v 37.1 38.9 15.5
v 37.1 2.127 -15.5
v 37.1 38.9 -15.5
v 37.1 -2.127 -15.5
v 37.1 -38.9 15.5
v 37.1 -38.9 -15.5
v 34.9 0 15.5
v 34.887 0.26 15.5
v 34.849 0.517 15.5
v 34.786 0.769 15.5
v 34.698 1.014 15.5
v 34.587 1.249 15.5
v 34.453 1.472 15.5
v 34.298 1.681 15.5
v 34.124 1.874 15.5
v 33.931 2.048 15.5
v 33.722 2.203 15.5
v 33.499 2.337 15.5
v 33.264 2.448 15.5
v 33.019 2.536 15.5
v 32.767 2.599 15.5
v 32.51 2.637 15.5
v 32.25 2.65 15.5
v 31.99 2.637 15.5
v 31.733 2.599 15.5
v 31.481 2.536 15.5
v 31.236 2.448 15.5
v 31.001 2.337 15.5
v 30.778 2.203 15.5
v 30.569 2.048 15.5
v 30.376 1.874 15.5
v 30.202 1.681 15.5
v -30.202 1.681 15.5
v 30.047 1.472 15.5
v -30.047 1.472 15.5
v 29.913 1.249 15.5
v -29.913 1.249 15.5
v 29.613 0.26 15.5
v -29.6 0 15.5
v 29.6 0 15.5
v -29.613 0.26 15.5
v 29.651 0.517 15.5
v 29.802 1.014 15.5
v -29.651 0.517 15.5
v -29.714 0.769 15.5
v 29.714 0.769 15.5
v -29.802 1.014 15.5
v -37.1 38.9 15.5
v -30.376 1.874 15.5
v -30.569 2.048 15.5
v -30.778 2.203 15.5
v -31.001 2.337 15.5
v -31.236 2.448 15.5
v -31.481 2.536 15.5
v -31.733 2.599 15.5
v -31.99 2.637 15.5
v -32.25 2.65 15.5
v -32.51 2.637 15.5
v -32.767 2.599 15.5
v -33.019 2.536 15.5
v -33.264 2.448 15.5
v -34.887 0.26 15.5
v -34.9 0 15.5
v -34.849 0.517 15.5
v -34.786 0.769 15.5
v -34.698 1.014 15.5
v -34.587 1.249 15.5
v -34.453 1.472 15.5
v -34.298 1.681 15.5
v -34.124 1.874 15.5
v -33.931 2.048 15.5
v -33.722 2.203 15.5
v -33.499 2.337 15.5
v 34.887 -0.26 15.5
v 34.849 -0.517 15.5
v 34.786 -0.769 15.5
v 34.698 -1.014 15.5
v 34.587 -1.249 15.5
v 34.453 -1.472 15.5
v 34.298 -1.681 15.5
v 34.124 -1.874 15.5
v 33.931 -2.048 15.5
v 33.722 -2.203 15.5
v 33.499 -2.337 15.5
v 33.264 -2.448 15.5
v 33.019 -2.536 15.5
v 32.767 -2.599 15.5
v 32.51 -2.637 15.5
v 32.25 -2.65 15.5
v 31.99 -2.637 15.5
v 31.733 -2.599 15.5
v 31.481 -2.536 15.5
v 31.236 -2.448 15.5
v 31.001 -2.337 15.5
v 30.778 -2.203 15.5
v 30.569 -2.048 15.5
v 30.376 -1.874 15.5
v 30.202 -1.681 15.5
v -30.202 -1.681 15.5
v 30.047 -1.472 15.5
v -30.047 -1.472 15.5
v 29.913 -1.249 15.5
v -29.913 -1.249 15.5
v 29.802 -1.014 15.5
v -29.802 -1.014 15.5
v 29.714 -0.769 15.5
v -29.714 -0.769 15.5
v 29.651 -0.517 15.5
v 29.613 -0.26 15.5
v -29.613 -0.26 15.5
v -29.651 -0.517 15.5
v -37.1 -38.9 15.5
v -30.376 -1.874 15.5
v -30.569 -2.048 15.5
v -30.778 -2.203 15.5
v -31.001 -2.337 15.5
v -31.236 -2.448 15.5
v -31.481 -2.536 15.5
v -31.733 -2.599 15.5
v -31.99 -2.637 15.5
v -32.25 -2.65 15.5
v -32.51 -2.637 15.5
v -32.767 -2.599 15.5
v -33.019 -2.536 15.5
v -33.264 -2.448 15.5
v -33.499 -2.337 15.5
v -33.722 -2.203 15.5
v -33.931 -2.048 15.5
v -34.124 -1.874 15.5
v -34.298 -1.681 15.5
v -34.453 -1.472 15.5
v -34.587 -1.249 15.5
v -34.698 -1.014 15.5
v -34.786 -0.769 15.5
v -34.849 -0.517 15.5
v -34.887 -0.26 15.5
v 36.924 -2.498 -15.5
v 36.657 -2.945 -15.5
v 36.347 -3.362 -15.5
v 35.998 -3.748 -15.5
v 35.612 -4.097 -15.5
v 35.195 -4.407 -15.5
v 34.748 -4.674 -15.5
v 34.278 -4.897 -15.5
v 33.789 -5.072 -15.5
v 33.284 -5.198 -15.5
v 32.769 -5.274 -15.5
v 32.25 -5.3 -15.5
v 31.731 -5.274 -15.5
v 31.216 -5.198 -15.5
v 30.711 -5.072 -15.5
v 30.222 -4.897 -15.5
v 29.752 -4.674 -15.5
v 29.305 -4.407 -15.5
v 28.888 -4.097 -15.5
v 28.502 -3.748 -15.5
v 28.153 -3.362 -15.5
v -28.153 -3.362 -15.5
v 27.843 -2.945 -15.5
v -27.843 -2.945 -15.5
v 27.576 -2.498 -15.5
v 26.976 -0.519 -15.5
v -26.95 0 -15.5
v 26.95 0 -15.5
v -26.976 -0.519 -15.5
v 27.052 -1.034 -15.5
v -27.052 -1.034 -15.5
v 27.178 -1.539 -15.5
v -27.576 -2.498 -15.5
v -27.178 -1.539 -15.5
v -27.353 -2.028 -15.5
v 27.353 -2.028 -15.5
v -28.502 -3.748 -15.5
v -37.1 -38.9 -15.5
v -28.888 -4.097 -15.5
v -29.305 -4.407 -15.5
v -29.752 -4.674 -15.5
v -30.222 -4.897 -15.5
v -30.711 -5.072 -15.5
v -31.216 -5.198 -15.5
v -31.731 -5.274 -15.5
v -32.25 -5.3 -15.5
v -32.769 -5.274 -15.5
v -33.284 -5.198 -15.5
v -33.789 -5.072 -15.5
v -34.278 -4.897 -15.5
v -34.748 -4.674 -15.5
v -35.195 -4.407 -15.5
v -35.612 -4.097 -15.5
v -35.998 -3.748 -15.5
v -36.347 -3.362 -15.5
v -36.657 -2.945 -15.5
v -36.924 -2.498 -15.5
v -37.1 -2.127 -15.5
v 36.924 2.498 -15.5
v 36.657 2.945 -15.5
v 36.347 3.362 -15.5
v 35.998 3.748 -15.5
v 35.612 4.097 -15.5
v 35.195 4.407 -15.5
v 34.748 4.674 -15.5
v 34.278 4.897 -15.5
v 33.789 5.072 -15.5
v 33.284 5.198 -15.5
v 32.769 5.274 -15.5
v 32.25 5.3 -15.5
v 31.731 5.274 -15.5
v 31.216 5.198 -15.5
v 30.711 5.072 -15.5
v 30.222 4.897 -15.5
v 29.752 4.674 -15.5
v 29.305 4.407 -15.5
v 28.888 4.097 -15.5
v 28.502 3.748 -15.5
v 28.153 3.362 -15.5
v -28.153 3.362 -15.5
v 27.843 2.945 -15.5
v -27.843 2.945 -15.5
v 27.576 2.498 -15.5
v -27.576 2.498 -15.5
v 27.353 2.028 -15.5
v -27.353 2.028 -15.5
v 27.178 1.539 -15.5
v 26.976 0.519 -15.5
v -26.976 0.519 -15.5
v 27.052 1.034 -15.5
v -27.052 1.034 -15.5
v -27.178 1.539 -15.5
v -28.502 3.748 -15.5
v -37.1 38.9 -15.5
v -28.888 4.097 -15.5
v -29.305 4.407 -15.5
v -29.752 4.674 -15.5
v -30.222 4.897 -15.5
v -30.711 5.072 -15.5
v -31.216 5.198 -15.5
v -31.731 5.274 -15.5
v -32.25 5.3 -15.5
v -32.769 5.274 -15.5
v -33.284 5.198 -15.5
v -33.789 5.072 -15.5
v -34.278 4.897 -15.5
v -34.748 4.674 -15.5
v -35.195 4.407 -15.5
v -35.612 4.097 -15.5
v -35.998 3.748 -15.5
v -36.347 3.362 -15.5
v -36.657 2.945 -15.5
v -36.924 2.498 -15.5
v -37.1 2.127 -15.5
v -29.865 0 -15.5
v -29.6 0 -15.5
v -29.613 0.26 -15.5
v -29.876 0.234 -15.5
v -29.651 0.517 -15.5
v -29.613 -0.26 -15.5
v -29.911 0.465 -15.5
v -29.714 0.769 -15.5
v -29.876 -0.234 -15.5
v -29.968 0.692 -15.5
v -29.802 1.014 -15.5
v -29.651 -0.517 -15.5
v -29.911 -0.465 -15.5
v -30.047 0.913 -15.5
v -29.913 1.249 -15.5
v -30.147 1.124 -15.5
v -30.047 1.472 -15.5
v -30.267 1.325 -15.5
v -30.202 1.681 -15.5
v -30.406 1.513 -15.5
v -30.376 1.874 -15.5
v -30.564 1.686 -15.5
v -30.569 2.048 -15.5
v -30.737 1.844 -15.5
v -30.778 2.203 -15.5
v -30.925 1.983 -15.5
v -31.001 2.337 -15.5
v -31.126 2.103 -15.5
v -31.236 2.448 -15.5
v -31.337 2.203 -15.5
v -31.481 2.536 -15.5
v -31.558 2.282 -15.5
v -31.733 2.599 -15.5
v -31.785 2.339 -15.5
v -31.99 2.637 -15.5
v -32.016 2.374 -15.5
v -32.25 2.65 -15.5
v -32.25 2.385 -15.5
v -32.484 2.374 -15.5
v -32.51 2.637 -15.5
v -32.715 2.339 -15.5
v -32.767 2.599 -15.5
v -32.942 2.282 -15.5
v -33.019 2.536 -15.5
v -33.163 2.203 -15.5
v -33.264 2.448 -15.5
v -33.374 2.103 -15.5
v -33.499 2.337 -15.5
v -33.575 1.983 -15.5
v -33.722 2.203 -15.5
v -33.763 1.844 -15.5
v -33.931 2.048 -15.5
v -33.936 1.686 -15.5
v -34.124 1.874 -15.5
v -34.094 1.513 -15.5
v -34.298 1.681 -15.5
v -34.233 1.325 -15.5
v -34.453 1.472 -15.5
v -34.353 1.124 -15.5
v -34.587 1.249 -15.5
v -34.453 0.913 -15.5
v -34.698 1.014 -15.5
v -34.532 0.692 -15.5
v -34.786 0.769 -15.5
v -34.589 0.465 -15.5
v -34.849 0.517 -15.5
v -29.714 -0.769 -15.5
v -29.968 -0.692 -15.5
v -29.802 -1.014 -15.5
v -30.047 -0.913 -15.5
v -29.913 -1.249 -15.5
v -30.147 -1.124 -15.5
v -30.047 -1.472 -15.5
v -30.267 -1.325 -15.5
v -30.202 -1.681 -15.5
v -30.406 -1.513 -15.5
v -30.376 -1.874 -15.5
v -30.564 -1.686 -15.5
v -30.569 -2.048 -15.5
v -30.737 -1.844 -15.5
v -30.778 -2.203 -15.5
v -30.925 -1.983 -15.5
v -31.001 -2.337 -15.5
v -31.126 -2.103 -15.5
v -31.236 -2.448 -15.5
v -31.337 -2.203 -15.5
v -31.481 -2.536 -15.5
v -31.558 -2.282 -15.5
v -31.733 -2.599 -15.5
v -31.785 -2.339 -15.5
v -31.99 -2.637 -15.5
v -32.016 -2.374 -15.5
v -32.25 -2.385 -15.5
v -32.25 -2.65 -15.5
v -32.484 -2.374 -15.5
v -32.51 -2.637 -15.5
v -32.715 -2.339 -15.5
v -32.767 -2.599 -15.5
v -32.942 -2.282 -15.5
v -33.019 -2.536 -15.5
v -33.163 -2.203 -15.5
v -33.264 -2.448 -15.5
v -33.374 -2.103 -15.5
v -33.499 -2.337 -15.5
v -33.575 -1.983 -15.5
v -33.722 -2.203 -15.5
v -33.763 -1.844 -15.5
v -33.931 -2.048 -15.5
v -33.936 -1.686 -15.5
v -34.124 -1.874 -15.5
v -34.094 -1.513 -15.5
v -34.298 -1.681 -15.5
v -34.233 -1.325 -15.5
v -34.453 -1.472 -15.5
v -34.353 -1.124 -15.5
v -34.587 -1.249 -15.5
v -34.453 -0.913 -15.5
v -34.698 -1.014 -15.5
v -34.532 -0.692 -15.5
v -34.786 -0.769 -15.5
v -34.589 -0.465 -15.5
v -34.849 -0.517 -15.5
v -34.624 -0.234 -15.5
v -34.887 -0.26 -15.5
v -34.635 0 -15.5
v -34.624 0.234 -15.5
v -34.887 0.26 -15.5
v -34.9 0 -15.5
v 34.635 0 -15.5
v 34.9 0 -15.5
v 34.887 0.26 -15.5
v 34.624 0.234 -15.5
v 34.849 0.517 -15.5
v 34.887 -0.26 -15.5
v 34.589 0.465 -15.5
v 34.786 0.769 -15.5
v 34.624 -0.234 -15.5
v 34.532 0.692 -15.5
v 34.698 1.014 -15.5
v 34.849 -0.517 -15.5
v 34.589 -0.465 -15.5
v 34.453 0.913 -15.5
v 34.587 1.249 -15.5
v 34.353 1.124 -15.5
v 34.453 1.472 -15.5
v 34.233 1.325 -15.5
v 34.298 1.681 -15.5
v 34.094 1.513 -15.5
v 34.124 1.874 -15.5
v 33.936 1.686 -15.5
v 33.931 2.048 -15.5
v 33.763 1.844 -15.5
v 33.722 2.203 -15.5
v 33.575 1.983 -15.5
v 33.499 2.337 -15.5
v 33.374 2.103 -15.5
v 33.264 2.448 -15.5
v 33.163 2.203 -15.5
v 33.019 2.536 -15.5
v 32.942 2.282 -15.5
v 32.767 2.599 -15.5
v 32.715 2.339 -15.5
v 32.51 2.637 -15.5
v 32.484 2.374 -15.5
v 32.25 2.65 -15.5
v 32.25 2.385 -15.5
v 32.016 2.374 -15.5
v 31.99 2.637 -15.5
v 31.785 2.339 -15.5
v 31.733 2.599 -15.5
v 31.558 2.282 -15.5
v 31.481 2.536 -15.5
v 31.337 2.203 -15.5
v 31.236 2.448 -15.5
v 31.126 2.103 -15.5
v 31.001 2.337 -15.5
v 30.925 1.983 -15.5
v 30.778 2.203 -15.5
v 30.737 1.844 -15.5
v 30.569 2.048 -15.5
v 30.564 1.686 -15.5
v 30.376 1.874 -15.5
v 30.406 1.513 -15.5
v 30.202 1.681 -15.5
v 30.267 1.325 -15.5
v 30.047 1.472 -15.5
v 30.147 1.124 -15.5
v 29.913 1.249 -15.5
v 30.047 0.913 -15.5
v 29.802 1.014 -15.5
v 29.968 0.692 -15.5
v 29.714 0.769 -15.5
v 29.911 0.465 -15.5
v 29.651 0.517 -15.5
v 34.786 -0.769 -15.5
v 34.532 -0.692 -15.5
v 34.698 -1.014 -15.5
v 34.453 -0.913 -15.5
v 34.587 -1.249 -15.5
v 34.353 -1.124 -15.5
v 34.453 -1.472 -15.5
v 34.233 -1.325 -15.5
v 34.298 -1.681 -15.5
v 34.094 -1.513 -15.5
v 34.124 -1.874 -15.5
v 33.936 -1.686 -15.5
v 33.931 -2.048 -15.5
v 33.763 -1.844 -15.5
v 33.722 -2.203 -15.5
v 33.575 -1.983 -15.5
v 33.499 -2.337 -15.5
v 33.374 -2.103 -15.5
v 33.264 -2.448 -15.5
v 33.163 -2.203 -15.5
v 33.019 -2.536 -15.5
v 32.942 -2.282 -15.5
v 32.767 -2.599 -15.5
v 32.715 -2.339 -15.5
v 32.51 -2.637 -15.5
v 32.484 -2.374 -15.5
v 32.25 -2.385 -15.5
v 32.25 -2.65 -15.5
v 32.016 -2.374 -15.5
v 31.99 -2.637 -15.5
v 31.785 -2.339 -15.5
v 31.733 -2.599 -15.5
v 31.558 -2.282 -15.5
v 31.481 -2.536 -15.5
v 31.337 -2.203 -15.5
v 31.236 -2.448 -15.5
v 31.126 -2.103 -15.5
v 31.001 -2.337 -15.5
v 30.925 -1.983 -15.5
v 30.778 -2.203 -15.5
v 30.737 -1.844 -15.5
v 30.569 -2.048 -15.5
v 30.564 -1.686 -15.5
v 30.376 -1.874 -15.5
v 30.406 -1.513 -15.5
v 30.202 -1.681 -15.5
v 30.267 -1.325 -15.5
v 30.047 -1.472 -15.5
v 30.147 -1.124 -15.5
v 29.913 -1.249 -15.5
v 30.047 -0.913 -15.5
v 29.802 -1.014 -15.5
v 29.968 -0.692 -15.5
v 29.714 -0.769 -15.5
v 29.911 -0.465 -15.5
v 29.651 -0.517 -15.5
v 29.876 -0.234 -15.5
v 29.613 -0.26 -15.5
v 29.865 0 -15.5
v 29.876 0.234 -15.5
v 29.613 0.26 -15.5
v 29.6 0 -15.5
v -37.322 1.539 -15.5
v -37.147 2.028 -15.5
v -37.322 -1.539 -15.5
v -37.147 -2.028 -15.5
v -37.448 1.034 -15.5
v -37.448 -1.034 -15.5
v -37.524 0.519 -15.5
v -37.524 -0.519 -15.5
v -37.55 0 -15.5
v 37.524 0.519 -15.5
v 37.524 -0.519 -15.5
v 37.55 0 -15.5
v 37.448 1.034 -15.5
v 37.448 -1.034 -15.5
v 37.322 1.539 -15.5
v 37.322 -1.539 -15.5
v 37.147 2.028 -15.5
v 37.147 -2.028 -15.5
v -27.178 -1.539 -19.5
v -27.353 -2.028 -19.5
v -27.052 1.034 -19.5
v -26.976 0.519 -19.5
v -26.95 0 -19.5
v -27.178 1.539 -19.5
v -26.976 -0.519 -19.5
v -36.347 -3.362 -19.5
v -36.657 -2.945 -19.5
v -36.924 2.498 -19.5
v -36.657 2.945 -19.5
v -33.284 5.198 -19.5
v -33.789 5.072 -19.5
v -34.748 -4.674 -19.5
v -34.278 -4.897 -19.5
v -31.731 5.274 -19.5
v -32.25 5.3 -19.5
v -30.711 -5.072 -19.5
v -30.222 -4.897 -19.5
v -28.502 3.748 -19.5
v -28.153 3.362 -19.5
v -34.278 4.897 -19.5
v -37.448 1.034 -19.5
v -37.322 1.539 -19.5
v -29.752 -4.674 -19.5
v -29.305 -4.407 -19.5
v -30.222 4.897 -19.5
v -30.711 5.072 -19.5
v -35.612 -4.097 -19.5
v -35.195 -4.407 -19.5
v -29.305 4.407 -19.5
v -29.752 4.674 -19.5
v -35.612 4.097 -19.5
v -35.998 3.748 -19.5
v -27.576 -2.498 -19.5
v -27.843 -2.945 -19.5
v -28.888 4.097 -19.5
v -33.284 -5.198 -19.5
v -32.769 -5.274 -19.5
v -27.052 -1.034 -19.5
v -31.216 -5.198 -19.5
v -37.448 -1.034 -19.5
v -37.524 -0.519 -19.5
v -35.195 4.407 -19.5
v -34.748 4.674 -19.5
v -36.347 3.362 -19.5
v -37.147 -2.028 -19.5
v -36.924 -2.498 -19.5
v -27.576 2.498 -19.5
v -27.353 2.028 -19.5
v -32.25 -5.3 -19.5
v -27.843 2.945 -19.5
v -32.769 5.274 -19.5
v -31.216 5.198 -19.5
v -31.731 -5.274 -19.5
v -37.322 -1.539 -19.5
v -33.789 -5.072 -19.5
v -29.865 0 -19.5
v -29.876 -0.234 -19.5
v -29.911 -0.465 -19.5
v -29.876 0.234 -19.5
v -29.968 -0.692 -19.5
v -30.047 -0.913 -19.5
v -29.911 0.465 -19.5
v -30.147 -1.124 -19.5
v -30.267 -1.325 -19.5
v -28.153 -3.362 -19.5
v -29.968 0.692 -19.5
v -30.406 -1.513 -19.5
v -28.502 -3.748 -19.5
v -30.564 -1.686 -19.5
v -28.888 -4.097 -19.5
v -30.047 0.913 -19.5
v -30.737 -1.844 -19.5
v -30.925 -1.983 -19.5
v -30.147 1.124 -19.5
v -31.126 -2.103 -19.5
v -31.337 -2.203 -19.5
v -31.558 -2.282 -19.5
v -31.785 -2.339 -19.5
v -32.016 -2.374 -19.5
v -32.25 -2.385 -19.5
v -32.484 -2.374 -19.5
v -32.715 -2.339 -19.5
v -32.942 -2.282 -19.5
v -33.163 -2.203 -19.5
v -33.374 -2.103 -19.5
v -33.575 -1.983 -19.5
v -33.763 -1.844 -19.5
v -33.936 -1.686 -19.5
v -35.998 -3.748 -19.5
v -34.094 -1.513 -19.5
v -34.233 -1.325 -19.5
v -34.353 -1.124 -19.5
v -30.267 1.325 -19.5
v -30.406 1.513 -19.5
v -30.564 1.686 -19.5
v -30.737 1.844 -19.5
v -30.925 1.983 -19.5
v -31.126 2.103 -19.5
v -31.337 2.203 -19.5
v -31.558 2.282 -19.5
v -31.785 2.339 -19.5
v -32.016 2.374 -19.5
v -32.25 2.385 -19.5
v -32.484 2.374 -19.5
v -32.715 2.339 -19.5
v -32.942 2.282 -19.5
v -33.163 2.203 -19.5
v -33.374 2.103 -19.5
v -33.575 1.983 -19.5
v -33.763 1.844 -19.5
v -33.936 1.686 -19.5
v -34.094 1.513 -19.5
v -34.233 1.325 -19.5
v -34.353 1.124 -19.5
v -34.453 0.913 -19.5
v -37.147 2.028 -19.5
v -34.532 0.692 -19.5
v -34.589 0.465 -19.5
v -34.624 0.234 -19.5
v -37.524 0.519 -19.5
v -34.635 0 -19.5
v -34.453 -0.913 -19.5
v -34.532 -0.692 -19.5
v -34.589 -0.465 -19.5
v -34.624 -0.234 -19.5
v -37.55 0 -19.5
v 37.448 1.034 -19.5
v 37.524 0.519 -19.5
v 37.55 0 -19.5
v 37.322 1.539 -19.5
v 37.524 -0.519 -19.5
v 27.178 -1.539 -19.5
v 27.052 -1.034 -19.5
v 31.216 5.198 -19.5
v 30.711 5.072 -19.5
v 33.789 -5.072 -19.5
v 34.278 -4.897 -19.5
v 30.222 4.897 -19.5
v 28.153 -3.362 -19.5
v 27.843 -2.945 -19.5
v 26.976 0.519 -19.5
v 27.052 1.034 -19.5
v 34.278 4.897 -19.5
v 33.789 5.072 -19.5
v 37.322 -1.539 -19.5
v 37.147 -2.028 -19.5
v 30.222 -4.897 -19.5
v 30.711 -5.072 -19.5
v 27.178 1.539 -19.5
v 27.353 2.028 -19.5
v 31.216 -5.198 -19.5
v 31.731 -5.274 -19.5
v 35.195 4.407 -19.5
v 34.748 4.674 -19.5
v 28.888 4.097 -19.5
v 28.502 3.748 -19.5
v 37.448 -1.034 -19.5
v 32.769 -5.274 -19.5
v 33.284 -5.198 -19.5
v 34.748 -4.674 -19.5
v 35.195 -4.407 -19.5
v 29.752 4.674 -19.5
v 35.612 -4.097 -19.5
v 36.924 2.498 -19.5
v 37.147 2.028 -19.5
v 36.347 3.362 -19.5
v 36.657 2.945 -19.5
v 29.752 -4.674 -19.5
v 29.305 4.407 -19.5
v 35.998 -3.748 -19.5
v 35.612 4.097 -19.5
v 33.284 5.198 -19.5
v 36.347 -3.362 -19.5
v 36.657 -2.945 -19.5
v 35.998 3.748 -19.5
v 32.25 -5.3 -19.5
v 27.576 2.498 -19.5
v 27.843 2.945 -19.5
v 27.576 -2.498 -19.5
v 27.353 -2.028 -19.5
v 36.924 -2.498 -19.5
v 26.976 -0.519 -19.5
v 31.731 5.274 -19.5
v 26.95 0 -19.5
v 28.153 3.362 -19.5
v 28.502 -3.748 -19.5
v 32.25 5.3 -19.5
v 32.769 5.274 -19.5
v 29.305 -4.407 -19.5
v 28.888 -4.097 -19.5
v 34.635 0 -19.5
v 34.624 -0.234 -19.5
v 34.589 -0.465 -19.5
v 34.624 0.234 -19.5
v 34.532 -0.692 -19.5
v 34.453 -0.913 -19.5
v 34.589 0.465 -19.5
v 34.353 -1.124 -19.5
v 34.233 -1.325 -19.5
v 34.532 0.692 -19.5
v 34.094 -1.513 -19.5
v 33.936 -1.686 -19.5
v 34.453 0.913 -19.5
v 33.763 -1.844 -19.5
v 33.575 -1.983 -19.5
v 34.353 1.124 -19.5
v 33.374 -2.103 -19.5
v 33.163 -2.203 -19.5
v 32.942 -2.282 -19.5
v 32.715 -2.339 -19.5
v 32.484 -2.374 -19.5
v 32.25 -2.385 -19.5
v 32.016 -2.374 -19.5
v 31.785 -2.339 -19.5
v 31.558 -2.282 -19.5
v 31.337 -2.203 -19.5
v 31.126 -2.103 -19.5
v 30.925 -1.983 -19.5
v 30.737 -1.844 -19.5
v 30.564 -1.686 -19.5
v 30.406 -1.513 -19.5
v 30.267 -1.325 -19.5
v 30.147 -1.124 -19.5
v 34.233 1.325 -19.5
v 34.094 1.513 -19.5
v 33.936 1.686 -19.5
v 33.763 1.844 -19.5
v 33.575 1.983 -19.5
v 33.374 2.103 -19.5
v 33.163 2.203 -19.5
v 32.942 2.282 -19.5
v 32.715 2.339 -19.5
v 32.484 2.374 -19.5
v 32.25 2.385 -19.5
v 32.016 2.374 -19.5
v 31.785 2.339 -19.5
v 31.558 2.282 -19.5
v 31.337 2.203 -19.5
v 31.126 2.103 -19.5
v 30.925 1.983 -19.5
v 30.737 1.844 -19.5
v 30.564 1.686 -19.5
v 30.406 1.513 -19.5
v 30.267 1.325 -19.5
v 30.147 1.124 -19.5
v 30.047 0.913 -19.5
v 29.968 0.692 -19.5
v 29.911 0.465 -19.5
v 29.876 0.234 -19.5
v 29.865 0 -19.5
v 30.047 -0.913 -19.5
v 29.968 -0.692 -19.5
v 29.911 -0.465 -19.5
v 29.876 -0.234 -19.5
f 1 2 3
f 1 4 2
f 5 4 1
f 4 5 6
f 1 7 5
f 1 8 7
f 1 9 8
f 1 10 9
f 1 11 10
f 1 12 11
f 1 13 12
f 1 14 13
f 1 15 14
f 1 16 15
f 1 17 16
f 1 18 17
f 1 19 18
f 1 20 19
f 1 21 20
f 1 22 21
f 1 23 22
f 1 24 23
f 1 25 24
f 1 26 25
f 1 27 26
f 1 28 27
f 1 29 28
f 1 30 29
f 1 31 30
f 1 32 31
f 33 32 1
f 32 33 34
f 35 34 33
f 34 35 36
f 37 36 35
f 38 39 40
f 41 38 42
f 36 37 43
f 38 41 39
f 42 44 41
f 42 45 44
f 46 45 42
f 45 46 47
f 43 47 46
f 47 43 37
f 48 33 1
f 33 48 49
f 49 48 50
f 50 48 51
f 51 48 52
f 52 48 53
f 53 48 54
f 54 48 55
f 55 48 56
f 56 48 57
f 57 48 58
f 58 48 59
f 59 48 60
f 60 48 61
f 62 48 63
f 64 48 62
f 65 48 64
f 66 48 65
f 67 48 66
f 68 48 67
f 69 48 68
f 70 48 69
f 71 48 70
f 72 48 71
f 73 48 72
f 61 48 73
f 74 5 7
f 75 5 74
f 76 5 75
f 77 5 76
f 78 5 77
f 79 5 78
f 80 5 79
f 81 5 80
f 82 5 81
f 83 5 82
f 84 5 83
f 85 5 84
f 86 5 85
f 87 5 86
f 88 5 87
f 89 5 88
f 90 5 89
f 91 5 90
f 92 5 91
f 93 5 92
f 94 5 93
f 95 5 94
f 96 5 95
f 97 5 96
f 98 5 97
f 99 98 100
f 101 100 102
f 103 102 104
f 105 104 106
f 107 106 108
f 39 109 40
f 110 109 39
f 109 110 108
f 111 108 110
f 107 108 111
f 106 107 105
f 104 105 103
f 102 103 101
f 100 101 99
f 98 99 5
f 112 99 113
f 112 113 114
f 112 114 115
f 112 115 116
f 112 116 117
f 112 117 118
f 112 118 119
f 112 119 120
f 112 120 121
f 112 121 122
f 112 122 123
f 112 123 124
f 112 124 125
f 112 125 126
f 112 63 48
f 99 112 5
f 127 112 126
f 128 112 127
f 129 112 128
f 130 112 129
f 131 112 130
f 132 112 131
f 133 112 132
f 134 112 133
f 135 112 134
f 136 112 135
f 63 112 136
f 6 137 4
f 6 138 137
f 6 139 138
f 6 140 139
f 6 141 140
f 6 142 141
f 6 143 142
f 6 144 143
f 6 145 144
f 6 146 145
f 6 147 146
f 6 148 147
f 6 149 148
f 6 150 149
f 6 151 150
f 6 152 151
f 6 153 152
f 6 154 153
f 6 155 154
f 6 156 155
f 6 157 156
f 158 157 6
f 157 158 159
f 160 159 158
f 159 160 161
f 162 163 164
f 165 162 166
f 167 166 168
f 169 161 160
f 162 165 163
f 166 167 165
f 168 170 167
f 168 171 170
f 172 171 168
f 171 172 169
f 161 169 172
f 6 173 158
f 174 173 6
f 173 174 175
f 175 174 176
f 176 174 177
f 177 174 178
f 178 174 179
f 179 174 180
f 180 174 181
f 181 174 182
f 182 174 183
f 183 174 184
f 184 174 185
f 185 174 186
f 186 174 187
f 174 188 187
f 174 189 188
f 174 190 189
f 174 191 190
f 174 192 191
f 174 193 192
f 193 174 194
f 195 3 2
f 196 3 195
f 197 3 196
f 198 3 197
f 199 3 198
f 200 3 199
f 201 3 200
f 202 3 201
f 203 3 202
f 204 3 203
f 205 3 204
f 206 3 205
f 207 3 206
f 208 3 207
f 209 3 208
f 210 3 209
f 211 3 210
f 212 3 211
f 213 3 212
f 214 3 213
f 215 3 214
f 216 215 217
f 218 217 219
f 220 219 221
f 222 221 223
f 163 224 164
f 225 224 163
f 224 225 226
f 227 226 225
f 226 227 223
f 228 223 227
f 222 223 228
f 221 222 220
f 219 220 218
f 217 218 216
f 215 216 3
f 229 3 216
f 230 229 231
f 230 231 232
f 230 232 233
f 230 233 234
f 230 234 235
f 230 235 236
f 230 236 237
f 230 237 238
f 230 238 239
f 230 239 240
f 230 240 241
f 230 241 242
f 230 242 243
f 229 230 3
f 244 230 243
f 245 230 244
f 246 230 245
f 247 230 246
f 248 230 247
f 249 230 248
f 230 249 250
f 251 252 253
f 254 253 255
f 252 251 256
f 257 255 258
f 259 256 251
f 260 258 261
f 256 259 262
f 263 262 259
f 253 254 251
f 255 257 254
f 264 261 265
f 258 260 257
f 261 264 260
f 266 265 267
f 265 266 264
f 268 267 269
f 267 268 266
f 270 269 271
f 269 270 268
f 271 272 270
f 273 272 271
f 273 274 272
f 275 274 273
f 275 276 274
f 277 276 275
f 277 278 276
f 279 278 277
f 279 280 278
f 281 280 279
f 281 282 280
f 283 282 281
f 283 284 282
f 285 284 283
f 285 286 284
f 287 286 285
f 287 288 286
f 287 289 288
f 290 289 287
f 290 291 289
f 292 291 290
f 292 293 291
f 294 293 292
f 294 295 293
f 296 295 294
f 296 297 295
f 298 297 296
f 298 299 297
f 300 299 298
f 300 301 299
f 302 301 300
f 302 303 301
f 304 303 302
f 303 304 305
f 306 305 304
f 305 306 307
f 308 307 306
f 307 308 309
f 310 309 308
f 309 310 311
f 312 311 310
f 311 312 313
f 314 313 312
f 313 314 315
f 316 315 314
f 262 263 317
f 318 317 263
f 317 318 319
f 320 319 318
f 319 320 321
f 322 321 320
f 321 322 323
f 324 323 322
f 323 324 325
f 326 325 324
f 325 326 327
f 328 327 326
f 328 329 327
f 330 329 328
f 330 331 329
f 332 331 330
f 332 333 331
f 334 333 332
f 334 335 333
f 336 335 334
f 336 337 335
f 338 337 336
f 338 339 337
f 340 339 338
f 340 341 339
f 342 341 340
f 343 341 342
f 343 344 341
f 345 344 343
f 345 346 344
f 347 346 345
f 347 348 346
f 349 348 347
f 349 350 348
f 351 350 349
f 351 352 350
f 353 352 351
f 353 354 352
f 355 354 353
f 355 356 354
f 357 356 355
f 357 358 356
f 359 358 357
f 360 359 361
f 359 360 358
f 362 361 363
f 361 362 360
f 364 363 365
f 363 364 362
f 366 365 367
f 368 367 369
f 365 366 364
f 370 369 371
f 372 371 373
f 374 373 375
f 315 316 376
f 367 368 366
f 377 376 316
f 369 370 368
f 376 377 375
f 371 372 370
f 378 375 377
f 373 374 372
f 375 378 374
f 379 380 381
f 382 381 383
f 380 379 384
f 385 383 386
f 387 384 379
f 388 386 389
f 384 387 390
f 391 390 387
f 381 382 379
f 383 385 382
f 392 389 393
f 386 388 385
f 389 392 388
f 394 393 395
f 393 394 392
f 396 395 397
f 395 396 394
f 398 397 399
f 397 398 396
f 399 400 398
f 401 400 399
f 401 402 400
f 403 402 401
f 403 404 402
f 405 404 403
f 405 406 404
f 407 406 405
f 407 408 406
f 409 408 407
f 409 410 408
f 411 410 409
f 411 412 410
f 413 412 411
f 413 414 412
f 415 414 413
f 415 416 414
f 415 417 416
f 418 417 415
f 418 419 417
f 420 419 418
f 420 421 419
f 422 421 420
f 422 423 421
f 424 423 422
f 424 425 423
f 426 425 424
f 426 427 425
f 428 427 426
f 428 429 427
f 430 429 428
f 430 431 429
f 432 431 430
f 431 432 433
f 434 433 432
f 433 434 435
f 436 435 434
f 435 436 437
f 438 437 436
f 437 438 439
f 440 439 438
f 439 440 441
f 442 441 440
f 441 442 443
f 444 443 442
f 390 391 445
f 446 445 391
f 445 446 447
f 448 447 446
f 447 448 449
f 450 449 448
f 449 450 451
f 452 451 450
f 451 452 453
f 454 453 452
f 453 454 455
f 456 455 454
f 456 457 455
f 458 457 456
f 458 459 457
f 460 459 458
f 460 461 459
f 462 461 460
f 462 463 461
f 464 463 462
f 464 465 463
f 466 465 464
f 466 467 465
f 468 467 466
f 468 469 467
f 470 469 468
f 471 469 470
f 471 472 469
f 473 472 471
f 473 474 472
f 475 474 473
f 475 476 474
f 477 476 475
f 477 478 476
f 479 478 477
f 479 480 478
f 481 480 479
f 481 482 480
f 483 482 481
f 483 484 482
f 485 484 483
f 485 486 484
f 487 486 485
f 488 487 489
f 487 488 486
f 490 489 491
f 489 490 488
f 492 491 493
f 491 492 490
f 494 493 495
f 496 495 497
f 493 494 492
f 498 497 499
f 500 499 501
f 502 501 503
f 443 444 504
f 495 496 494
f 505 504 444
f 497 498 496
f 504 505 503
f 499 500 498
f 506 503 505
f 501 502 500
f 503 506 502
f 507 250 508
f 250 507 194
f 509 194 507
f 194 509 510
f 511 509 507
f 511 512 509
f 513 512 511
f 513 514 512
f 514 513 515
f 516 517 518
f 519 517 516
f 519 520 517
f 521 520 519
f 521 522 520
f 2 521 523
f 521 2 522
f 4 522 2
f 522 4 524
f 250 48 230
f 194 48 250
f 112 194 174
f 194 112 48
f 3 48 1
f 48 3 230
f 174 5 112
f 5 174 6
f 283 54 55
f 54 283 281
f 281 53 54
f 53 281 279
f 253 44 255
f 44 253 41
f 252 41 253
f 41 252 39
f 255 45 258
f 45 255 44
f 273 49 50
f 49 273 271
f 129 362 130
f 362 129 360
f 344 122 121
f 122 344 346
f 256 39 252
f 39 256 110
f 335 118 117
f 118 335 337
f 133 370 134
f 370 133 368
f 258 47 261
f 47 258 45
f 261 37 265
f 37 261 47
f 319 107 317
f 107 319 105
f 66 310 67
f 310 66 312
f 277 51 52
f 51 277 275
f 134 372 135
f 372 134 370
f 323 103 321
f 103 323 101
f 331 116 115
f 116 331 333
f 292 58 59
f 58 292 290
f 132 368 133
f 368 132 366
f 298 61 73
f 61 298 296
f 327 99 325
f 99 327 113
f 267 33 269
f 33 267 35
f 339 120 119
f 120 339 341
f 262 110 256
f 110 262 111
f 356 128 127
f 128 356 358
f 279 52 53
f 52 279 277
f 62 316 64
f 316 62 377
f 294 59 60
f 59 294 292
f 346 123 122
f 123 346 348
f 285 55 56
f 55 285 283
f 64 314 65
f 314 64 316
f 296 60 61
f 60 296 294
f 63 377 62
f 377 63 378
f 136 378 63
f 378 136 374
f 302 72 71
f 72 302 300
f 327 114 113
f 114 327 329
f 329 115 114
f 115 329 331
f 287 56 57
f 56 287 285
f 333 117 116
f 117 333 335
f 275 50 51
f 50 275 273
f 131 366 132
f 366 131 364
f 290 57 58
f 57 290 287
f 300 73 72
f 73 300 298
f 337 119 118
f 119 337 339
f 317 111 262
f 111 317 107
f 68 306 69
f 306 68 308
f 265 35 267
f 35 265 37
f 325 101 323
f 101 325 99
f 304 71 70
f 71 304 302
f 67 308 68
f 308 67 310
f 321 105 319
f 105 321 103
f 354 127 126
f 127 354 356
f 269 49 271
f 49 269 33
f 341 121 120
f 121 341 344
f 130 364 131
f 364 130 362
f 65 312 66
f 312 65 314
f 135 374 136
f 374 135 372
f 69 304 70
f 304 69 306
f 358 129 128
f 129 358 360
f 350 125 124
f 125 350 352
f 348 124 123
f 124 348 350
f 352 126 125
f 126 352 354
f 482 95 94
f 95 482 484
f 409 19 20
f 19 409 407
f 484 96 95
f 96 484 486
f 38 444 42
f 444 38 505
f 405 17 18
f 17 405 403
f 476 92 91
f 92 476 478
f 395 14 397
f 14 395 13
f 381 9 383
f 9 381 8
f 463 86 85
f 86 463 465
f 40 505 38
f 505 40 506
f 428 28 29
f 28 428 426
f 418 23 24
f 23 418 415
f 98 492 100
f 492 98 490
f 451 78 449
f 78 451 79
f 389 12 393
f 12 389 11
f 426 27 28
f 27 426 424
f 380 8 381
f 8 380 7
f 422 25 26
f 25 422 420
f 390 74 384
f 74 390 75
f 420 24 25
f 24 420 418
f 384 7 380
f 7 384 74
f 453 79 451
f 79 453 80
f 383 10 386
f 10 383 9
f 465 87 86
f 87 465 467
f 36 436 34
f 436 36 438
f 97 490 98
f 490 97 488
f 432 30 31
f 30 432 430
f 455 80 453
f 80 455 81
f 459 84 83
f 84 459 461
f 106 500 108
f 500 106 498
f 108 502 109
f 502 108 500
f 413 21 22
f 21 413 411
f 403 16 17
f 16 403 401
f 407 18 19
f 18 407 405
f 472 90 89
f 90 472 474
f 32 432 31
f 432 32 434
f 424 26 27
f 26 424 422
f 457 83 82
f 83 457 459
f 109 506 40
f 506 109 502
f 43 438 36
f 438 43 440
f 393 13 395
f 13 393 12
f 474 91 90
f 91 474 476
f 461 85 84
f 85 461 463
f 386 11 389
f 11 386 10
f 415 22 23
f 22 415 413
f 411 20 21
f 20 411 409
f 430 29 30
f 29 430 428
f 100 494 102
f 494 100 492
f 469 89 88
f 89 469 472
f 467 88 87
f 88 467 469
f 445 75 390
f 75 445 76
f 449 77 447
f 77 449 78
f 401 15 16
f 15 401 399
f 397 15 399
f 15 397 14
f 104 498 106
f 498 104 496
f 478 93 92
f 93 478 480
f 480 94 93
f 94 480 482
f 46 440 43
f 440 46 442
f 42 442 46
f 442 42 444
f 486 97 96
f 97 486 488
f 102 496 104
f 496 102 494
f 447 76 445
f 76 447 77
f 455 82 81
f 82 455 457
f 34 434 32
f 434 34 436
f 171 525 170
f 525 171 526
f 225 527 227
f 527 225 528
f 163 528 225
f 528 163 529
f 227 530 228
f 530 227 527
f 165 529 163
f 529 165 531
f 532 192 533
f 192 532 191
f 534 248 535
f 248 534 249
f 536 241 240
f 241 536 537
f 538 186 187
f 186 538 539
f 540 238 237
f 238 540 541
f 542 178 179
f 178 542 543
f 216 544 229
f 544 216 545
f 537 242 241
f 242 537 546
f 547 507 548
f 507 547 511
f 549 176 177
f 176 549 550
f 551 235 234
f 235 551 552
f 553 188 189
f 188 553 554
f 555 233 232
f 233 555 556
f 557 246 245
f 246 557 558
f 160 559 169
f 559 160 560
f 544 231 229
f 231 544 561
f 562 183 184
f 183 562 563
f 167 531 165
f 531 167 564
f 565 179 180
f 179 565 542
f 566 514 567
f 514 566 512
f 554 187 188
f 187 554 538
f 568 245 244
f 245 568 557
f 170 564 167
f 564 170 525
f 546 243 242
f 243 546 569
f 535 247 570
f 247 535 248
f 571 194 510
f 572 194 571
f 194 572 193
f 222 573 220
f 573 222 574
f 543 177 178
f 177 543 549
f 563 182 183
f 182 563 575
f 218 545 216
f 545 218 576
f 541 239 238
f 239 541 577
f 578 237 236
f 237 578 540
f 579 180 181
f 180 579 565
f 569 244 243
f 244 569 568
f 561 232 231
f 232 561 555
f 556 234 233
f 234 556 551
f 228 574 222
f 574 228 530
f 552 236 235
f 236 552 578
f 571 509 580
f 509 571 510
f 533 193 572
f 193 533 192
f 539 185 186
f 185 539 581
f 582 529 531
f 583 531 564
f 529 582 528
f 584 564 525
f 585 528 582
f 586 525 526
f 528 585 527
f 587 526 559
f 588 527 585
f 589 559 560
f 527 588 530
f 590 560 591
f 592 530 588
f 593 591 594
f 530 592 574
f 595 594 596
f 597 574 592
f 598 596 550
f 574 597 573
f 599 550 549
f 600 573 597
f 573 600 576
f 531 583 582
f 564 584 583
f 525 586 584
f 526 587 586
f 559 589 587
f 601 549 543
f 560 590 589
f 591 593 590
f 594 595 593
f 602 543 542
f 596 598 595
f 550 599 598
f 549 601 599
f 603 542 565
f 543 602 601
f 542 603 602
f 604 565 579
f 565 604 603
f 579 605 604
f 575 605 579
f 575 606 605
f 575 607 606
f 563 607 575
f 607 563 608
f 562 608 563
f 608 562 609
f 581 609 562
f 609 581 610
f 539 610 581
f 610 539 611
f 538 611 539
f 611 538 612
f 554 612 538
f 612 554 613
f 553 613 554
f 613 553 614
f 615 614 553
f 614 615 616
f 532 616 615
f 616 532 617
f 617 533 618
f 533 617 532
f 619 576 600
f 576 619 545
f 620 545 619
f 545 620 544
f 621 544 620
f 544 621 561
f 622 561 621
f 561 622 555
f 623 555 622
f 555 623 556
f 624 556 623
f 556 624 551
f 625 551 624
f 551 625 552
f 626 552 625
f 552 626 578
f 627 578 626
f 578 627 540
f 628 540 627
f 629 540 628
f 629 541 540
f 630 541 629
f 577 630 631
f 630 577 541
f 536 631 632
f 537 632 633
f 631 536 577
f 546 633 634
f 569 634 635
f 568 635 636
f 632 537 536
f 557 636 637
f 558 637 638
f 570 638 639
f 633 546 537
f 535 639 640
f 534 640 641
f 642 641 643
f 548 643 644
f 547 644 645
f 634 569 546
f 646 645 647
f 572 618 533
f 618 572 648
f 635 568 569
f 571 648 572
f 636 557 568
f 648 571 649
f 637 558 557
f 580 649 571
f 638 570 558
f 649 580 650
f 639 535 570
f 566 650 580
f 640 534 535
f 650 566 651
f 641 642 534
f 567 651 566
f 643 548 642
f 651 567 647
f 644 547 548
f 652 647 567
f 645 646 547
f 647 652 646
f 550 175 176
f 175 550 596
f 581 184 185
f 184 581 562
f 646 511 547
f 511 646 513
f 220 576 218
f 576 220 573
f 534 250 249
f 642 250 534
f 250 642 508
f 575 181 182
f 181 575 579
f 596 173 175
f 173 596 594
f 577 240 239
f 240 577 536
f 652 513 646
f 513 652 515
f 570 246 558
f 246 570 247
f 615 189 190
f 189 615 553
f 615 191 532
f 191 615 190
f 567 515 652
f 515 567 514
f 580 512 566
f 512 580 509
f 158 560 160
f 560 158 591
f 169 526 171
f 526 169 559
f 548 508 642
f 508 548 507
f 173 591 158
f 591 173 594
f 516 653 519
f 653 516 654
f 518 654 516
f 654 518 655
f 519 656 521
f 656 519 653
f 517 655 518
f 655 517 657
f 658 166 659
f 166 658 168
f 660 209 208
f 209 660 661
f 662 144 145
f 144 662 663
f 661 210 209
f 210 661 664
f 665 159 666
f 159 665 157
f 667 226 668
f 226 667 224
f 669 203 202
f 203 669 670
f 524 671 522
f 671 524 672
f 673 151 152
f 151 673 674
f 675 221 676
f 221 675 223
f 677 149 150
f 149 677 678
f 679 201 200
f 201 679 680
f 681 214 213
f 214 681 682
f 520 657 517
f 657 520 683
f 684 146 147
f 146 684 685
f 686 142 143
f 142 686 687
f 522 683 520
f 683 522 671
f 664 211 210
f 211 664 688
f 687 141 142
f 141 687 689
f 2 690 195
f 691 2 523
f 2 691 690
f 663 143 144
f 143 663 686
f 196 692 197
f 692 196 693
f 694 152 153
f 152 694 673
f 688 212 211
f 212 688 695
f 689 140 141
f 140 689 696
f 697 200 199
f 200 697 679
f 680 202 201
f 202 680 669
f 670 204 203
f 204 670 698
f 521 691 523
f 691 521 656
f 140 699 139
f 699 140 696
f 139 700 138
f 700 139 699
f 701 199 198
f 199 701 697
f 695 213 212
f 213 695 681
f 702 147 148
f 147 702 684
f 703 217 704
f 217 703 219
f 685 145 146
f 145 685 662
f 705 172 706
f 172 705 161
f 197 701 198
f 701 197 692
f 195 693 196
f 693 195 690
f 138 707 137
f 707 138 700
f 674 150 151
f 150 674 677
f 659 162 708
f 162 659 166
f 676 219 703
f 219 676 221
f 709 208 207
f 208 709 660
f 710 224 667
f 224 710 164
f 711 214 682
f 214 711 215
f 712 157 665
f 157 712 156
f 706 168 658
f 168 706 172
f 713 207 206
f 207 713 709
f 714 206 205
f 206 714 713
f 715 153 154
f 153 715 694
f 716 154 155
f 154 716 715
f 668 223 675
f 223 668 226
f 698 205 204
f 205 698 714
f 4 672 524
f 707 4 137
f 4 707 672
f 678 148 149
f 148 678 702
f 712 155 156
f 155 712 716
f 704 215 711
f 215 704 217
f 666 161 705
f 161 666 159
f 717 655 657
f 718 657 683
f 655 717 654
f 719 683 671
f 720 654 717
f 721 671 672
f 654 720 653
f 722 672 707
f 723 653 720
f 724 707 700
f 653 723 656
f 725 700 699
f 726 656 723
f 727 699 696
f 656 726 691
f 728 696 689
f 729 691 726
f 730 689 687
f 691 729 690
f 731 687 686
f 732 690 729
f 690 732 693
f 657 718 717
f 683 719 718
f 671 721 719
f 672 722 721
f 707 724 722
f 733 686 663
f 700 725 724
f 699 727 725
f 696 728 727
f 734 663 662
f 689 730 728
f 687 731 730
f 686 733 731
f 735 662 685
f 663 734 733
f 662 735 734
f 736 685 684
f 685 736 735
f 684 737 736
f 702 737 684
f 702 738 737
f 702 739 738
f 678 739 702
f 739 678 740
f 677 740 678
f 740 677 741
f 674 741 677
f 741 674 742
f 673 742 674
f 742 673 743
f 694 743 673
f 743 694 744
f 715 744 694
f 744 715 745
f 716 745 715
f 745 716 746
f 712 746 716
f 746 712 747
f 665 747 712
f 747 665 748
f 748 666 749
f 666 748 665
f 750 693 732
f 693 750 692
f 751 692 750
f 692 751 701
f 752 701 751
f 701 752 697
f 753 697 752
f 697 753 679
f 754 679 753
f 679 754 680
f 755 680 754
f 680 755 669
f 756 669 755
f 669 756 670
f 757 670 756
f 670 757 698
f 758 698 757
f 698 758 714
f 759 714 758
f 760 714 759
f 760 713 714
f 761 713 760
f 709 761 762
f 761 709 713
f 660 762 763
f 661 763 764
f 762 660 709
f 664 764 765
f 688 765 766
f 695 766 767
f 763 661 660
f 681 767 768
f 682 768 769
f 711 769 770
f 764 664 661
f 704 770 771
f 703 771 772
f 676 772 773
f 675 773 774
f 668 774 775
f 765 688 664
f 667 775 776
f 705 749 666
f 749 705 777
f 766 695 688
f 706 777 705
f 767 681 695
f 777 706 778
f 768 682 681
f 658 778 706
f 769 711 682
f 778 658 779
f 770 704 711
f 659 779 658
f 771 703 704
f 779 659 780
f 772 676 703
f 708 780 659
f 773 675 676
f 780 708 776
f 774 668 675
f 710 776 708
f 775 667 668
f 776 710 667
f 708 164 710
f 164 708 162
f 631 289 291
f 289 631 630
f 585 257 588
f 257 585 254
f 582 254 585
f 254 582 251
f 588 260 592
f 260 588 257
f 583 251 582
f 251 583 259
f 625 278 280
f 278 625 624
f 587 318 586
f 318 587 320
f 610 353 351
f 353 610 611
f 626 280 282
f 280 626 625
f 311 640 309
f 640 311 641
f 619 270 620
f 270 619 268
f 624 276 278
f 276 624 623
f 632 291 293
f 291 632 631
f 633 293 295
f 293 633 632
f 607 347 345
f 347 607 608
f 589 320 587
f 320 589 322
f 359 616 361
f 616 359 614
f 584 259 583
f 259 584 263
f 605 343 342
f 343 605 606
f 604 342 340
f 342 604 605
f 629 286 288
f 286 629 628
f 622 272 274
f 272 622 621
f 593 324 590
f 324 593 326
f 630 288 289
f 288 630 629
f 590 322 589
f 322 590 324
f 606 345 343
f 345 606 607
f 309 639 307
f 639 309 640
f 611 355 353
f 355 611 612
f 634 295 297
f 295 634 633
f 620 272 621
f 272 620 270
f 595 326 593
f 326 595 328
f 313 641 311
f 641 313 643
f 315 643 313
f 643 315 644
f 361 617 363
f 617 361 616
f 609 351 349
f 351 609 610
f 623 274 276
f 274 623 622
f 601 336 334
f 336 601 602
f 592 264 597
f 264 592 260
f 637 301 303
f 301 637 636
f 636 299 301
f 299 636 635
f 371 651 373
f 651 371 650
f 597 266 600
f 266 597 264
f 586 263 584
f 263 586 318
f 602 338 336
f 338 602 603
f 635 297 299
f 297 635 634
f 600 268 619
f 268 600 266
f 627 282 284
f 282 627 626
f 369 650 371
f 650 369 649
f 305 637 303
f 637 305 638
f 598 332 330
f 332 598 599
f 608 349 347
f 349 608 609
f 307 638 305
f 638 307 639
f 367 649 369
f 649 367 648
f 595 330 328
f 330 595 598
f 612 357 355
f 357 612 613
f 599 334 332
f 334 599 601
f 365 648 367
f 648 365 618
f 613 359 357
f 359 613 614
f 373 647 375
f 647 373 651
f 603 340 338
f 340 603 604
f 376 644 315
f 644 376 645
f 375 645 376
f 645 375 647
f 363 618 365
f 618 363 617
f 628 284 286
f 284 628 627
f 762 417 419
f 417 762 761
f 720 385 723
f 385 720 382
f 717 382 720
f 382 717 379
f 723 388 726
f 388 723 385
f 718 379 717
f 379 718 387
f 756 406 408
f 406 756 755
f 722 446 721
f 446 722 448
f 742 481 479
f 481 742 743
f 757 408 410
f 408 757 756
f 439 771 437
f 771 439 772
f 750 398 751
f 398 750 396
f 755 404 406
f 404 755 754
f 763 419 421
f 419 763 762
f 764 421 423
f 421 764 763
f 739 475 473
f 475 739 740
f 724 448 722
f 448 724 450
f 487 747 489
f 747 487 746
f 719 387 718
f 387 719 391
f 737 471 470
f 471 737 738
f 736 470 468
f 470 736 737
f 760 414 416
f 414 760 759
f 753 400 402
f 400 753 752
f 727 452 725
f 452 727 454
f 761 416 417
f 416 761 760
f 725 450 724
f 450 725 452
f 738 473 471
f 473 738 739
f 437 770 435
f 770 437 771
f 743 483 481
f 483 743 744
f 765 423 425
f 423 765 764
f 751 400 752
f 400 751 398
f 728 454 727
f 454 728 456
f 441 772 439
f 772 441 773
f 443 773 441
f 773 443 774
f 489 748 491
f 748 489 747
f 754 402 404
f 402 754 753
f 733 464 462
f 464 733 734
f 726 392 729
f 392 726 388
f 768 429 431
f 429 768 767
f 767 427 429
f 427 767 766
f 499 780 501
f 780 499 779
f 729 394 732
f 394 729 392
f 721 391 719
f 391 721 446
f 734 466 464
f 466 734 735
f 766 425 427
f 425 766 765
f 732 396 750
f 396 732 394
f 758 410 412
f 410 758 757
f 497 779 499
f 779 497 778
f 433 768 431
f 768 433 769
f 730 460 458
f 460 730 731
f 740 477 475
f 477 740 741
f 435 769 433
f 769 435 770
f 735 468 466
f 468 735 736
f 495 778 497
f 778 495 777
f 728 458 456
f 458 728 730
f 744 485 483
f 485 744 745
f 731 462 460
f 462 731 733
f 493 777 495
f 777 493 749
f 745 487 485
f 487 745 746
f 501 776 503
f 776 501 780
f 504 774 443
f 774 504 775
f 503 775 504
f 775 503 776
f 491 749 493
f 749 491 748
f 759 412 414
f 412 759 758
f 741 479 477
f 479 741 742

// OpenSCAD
// file: power.scad
$fn = 64;
POWER_WIDTH = 74.2;
POWER_DEPTH = 77.8;
POWER_HEIGHT = 31.0;
POWER_HOLE_DIAM = 5.3;
POWER_HOLE_X_DIST = 64.5;
POWER_MOUNT_HEIGHT = 4;
POWER_SCREW_DIAM = POWER_HOLE_DIAM * 0.9;

module power(){
  difference(){
    /* Body */
    union(){
      cube([POWER_WIDTH, POWER_DEPTH, POWER_HEIGHT], true);
    }
    /* Left screw hole */
    translate([-POWER_HOLE_X_DIST / 2, 0, 0]){
      cylinder(POWER_DEPTH * 2, POWER_HOLE_DIAM / 2, POWER_HOLE_DIAM / 2, true);
    }
    /* Right screw hole */
    translate([POWER_HOLE_X_DIST / 2, 0, 0]){
      cylinder(POWER_DEPTH * 2, POWER_HOLE_DIAM / 2, POWER_HOLE_DIAM / 2, true);
    }
  }
}

power();
// main file
include <power.scad>;

module power_mount(){
  difference(){
    union(){
      /* Left screw hole */
      translate([-POWER_HOLE_X_DIST / 2, 0, -(POWER_HEIGHT + POWER_MOUNT_HEIGHT) / 2]){
        cylinder(POWER_MOUNT_HEIGHT, POWER_HOLE_DIAM, POWER_HOLE_DIAM, true);
      }
      /* Right screw hole */
      translate([POWER_HOLE_X_DIST / 2, 0, -(POWER_HEIGHT + POWER_MOUNT_HEIGHT) / 2]){
        cylinder(POWER_MOUNT_HEIGHT, POWER_HOLE_DIAM, POWER_HOLE_DIAM, true);
      }
    }
    /* Left screw hole */
    translate([-POWER_HOLE_X_DIST / 2, 0, 0]){
      cylinder(POWER_DEPTH * 2, POWER_SCREW_DIAM / 2, POWER_SCREW_DIAM / 2, true);
    }
    /* Right screw hole */
    translate([POWER_HOLE_X_DIST / 2, 0, 0]){
      cylinder(POWER_DEPTH * 2, POWER_SCREW_DIAM / 2, POWER_SCREW_DIAM / 2, true);
    }
  }
}

power_mount();
